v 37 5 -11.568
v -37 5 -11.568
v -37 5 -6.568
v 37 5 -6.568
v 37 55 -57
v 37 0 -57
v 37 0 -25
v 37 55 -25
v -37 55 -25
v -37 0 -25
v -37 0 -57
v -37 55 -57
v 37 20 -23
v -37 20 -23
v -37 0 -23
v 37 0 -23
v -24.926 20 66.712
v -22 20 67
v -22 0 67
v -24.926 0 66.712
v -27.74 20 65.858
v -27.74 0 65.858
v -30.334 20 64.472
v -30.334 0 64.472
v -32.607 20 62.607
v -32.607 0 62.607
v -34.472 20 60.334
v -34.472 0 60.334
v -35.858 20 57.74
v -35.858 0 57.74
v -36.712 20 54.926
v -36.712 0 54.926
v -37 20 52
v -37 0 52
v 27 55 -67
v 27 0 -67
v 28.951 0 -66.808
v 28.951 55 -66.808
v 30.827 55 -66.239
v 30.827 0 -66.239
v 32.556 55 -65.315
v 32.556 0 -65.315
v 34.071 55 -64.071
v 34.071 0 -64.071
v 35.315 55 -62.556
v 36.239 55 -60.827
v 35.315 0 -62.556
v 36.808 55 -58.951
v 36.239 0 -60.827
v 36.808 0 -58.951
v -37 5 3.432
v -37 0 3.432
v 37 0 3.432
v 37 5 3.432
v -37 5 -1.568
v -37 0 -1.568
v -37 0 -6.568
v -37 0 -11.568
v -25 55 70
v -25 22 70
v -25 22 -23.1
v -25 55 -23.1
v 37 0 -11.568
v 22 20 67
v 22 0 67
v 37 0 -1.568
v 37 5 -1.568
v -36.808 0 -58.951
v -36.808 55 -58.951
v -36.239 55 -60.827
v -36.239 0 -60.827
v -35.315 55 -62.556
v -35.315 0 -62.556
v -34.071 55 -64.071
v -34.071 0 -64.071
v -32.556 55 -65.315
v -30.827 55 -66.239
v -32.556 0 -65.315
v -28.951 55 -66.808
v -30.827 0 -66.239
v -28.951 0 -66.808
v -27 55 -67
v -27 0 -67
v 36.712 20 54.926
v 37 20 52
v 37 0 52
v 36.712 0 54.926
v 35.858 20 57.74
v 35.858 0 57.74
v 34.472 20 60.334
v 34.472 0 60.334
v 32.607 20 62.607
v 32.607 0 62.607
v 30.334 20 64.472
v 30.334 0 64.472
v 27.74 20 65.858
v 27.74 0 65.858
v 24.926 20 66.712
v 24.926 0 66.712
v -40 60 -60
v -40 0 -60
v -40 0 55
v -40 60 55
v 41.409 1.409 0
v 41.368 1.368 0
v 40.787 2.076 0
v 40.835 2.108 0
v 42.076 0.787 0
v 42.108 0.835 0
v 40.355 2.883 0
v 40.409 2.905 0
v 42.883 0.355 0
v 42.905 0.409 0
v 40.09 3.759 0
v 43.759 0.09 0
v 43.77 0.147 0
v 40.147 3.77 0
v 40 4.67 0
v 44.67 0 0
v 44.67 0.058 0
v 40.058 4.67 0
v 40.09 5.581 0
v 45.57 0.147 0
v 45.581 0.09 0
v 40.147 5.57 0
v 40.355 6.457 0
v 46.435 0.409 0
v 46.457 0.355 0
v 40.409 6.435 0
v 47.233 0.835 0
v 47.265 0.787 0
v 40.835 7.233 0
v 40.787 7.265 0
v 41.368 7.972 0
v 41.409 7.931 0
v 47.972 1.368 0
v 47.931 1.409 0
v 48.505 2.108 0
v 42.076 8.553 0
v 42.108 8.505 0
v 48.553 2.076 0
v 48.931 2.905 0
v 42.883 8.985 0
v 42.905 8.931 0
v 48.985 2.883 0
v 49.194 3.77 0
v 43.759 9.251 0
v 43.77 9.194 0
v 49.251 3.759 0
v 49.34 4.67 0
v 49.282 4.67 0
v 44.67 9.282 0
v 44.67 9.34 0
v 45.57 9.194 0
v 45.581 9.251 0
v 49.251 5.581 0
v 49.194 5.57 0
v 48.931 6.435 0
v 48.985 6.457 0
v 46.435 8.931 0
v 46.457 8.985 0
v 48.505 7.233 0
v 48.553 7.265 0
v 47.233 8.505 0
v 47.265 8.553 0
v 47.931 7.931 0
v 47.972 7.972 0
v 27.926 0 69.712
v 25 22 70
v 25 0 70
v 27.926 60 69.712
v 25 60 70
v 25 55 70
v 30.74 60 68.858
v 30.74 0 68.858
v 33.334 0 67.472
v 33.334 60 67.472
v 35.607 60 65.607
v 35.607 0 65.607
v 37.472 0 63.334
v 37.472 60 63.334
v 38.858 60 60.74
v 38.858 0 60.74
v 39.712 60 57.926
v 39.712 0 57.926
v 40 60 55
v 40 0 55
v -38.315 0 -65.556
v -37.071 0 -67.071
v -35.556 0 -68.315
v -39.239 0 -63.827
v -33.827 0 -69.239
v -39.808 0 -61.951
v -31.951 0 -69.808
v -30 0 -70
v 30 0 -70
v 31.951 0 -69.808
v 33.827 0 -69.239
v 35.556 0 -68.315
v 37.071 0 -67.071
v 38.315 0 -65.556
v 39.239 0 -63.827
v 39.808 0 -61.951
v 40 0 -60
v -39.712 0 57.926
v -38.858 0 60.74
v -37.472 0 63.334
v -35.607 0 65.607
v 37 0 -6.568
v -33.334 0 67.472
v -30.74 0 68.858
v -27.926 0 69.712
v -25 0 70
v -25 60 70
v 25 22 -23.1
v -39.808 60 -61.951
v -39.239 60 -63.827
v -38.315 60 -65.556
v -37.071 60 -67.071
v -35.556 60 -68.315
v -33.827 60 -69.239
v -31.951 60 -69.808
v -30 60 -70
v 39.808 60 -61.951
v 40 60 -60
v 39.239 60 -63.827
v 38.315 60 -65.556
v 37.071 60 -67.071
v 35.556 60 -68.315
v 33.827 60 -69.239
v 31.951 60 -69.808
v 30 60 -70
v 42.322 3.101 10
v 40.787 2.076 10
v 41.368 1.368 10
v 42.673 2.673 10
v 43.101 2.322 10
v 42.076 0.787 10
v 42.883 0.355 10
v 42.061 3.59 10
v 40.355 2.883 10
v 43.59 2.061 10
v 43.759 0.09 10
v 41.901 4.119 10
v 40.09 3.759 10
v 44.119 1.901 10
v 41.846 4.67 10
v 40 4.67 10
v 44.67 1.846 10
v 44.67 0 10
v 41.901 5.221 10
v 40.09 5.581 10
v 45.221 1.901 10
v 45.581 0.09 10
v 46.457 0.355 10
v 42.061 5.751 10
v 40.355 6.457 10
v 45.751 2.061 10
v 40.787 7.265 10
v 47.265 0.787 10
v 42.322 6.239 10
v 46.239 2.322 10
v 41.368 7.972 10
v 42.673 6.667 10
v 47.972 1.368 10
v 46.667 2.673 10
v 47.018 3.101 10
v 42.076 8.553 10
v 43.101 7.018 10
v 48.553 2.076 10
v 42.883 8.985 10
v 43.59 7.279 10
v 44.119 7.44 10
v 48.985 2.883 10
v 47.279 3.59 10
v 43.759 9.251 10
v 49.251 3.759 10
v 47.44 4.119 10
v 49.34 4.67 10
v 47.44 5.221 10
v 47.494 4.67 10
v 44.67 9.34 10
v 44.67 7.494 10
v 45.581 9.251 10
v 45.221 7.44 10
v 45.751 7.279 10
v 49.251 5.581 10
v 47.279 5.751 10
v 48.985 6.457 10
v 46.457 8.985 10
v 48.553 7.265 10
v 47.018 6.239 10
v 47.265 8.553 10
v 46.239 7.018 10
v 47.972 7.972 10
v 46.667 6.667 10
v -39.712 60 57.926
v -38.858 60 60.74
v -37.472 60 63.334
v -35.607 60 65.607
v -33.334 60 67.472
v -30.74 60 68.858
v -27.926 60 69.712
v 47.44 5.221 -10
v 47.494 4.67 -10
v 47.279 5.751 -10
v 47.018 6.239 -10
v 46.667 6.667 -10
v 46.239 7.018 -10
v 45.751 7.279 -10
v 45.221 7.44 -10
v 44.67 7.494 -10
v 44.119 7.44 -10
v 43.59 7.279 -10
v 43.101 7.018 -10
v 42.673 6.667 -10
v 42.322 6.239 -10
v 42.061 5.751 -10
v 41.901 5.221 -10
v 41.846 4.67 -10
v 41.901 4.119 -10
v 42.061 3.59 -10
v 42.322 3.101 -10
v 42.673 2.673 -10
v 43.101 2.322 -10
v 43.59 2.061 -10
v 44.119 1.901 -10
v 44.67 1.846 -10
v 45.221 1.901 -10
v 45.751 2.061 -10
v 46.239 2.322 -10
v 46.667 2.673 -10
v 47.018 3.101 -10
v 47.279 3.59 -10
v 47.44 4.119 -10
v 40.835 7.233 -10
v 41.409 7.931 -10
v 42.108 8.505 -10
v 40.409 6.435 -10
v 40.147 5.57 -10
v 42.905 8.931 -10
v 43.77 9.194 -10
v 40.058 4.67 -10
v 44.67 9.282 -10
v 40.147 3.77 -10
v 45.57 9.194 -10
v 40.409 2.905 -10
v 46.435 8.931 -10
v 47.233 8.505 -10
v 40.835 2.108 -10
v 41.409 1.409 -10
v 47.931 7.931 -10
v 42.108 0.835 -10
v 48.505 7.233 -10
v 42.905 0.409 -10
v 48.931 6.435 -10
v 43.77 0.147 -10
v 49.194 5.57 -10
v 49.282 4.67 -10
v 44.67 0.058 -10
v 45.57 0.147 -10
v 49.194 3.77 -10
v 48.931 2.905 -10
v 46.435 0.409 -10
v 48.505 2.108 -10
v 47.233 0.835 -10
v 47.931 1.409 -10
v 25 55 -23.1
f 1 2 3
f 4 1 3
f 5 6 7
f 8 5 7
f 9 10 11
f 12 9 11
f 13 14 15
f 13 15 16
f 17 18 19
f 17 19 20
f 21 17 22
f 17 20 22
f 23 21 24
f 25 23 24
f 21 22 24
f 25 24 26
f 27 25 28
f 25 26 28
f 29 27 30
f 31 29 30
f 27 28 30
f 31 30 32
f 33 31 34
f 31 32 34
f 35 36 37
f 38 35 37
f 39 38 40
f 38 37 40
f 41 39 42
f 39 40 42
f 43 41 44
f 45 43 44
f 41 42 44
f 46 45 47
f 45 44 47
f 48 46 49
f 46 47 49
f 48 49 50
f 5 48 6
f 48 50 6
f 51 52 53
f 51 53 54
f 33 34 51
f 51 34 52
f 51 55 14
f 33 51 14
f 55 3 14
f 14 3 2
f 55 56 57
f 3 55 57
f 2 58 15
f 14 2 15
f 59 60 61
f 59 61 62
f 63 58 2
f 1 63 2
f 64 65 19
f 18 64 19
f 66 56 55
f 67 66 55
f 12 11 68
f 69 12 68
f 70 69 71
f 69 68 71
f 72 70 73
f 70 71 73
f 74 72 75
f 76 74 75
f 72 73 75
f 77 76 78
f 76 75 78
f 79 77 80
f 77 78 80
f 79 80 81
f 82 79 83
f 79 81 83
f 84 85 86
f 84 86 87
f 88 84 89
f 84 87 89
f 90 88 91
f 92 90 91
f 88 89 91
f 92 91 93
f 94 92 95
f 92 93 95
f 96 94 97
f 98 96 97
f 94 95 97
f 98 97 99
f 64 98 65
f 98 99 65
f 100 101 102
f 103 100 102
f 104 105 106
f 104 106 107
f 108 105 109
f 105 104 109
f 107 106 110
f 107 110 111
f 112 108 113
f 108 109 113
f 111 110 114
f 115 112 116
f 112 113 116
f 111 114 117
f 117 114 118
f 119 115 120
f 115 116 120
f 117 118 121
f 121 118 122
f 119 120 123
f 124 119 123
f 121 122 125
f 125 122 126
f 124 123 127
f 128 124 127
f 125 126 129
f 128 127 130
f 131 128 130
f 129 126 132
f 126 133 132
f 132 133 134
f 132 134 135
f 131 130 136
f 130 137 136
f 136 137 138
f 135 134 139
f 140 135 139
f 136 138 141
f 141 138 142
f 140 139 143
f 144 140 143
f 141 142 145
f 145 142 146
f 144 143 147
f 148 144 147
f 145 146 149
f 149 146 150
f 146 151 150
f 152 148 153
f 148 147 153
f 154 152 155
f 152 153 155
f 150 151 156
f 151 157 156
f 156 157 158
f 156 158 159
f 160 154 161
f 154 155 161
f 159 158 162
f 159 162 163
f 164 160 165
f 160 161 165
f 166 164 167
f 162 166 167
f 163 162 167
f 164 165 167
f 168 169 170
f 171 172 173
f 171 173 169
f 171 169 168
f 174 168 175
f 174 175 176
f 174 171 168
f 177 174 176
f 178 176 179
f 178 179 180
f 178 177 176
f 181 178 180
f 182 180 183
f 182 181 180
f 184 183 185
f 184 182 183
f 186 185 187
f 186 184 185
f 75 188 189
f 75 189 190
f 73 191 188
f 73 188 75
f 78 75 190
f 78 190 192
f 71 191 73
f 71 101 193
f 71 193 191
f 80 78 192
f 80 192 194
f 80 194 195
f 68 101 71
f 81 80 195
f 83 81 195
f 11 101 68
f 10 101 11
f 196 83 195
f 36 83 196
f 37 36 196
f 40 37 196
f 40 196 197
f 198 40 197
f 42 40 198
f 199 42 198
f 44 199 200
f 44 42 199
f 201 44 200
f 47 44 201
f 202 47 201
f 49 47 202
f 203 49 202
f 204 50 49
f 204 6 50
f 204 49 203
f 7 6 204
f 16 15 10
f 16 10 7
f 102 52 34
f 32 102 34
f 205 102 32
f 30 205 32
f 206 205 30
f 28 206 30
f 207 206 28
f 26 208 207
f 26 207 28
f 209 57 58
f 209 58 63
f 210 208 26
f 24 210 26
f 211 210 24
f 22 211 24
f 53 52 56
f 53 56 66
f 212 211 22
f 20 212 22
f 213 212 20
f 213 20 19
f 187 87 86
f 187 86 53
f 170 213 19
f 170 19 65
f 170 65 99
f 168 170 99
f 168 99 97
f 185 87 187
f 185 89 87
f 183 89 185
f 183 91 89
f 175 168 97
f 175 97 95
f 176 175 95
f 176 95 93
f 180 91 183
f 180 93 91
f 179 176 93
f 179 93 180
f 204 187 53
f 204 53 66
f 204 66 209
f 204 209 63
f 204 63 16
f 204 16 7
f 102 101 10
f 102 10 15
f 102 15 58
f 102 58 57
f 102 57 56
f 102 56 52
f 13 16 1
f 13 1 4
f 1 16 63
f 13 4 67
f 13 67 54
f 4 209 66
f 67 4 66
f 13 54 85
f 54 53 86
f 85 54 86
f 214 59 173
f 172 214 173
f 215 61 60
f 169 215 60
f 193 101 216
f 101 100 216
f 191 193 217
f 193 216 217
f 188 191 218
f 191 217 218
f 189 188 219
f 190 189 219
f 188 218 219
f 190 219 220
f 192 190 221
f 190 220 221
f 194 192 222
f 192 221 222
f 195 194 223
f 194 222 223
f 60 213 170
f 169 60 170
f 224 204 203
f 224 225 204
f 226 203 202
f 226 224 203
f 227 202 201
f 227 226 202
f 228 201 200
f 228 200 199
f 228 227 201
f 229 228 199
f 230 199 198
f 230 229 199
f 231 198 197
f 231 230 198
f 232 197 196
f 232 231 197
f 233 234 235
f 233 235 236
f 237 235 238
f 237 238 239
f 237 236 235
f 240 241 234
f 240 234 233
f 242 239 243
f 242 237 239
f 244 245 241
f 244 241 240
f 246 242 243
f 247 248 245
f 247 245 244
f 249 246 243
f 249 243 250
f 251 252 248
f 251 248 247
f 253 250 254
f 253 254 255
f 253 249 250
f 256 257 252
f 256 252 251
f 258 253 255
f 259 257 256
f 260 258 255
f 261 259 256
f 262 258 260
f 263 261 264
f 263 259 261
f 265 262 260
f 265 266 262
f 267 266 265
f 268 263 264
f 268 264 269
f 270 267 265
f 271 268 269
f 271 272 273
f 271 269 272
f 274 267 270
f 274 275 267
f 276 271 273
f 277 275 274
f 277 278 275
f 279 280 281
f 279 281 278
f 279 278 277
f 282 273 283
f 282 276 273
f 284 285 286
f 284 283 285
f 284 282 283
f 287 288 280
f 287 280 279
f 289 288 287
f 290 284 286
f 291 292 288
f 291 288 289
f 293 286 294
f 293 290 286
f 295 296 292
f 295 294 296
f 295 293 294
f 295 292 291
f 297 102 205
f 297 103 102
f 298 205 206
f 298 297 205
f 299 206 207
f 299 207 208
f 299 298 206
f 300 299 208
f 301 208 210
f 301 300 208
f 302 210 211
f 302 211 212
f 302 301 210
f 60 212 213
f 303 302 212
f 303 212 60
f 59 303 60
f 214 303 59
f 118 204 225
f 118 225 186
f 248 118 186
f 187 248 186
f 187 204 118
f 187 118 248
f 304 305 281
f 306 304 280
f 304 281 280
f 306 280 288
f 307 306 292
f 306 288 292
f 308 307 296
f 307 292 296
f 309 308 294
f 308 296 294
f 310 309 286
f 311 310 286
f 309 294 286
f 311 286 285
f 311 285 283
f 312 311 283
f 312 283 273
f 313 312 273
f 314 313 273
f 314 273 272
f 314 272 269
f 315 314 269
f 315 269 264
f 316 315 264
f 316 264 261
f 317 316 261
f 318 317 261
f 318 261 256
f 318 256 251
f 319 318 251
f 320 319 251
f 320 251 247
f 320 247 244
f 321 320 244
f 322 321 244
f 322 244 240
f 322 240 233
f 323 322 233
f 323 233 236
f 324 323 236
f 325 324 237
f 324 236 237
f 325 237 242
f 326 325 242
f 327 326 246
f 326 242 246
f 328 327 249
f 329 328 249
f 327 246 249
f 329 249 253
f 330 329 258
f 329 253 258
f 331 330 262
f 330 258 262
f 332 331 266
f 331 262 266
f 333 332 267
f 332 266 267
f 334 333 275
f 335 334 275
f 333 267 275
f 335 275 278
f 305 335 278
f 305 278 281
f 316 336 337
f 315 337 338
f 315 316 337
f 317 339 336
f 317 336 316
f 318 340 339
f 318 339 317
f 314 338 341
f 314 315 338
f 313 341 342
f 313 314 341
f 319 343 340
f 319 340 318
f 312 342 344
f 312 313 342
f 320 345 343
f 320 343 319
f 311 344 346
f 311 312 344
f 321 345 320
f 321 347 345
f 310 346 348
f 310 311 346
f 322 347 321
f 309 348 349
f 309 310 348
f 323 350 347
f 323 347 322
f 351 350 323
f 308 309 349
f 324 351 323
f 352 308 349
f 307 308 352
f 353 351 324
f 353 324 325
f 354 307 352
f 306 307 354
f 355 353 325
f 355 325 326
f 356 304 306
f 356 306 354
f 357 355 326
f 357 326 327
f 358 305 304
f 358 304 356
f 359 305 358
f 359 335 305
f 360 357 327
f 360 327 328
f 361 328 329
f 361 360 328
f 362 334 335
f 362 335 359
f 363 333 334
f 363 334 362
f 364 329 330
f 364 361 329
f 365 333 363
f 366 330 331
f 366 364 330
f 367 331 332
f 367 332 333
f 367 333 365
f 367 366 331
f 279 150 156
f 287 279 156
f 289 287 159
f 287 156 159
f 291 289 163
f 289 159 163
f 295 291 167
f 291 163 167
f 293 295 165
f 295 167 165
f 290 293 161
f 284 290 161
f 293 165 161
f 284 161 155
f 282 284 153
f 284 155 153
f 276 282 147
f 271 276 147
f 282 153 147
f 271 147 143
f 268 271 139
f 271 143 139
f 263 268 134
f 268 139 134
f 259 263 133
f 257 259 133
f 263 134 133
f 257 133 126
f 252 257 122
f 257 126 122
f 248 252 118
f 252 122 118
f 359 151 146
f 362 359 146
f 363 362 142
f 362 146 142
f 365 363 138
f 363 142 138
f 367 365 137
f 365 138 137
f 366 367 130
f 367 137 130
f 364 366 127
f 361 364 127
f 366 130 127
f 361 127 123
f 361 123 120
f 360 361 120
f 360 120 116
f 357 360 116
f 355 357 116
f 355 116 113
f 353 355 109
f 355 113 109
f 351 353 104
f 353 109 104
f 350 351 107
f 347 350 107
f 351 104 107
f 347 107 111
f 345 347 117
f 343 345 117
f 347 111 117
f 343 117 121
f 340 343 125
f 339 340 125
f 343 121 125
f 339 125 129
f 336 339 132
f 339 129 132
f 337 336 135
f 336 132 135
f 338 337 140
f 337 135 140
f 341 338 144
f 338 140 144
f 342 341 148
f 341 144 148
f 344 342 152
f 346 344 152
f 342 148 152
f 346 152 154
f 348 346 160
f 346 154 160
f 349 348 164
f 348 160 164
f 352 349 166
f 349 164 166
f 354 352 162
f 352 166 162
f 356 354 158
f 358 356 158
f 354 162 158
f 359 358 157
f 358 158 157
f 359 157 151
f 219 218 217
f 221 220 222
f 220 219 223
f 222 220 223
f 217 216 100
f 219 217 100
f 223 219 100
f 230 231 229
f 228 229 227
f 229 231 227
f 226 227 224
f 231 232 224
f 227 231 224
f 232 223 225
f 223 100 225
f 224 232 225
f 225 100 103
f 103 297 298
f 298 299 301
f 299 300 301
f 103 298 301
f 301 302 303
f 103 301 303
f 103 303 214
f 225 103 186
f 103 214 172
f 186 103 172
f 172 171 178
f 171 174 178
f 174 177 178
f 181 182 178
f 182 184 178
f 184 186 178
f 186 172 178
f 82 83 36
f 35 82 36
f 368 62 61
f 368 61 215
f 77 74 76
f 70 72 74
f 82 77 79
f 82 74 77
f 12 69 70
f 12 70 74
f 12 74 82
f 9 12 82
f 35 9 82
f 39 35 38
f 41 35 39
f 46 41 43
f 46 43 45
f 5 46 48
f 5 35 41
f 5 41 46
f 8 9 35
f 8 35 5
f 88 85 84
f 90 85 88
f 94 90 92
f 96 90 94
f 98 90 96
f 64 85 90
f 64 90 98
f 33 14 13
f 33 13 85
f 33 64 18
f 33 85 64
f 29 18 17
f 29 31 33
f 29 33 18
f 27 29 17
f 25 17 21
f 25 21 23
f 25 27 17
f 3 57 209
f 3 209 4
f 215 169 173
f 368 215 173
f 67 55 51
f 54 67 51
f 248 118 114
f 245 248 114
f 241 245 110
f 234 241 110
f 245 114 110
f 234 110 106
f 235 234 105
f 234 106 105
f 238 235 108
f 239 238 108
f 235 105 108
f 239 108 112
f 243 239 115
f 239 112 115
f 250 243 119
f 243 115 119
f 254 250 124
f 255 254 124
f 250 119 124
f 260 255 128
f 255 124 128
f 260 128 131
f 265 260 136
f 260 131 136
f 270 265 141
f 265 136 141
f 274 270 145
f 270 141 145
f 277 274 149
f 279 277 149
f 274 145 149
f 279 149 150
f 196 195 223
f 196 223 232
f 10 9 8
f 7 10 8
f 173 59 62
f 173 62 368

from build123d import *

# Parameters (mm, degrees)
F0_W      = 80
F0_H      = 140
F1_DEPTH  = 60
F2_R      = 15
F3_R      = 15
F4_R      = 10
F6_DEPTH  = 55
F8_DEPTH  = 20
F9_W      = 74
F9_H      = 2
F10_DEPTH = 20
F11_W     = 50
F11_H     = 35
F12_DEPTH = 93.1
F13_W     = 2
F13_H     = 93.1
F14_DEPTH = 50
F15_W     = 5
F15_H     = 5
F16_DEPTH = 74
F17_R     = 4.670153
F18_DEPTH = 10
F19_R     = 4.612239
F20_DEPTH = 10
F21_R     = 2.823736
F22_DEPTH = 30.5


with BuildPart() as f1:
    # F0 (on Front) → F1 (new body)
    with BuildSketch(Plane.XZ):
        Rectangle(F0_W, F0_H)
    extrude(amount=-F1_DEPTH)

    # F2
    f2_edges = [f1.edges().sort_by_distance(p)[0] for p in [
        (-40, 30, 70),
    ]]
    fillet(f2_edges, radius=F2_R)

    # F3
    f3_edges = [f1.edges().sort_by_distance(p)[0] for p in [
        (40, 30, 70),
    ]]
    fillet(f3_edges, radius=F3_R)

    # F4
    f4_edges = [f1.edges().sort_by_distance(p)[0] for p in [
        (-40, 30, -70),
        (40, 30, -70),
    ]]
    fillet(f4_edges, radius=F4_R)

    # F5 (on face) → F6 (cut)
    with BuildSketch(Plane.XZ):
        with BuildLine():
            Line((37, -57), (37, -25))
            Line((37, -25), (-37, -25))
            Line((-37, -25), (-37, -57))
            ThreePointArc((-37, -57), (-34.071068, -64.071068), (-27, -67))
            Line((-27, -67), (27, -67))
            ThreePointArc((27, -67), (34.071068, -64.071068), (37, -57))
        make_face()
    extrude(amount=-F6_DEPTH, mode=Mode.SUBTRACT)

    # F7 (on face) → F8 (cut)
    with BuildSketch(Plane.XZ):
        with BuildLine():
            ThreePointArc((37, 52), (32.606602, 62.606602), (22, 67))
            Line((22, 67), (-22, 67))
            ThreePointArc((-22, 67), (-32.606602, 62.606602), (-37, 52))
            Line((-37, 52), (-37, -25))
            Line((-37, -25), (37, -25))
            Line((37, -25), (37, 52))
        make_face()
    extrude(amount=-F8_DEPTH, mode=Mode.SUBTRACT)

    # F9 (on face) → F10 (join)
    with BuildSketch(Plane.XZ.offset(-20)):
        with Locations((0, -24)):
            Rectangle(F9_W, F9_H)
    extrude(amount=F10_DEPTH)

    # F11 (on face) → F12 (cut)
    with BuildSketch(Plane.XY.offset(70)):
        with Locations((0, 37.5)):
            Rectangle(F11_W, F11_H)
    extrude(amount=-F12_DEPTH, mode=Mode.SUBTRACT)

    # F13 (on face) → F14 (join)
    with BuildSketch(Plane.YZ.offset(-25)):
        with Locations((21, 23.45)):
            Rectangle(F13_W, F13_H)
    extrude(amount=F14_DEPTH)

    # F15 (on face) → F16 (join)
    with BuildSketch(Plane.YZ.offset(-37)):
        with Locations((2.5, 0.932154)):
            Rectangle(F15_W, F15_H)
        with Locations((2.5, -9.067846)):
            Rectangle(F15_W, F15_H)
    extrude(amount=F16_DEPTH)

    # F17 (on Top) → F18 (join)
    with BuildSketch(Plane.XY):
        with Locations((44.670153, 4.670153)):
            Circle(F17_R)
    extrude(amount=F18_DEPTH)

    # F19 (on face) → F20 (join)
    with BuildSketch(Plane(origin=(0, 0, 0), x_dir=(1, 0, 0), z_dir=(0, 0, -1))):
        with Locations((44.670153, -4.670153)):
            Circle(F19_R)
    extrude(amount=F20_DEPTH)

    # F21 (on face) → F22 (cut)
    with BuildSketch(Plane.XY.offset(10)):
        with Locations((44.670153, 4.670153)):
            Circle(F21_R)
    extrude(amount=-F22_DEPTH, mode=Mode.SUBTRACT)


solid = f1.part
